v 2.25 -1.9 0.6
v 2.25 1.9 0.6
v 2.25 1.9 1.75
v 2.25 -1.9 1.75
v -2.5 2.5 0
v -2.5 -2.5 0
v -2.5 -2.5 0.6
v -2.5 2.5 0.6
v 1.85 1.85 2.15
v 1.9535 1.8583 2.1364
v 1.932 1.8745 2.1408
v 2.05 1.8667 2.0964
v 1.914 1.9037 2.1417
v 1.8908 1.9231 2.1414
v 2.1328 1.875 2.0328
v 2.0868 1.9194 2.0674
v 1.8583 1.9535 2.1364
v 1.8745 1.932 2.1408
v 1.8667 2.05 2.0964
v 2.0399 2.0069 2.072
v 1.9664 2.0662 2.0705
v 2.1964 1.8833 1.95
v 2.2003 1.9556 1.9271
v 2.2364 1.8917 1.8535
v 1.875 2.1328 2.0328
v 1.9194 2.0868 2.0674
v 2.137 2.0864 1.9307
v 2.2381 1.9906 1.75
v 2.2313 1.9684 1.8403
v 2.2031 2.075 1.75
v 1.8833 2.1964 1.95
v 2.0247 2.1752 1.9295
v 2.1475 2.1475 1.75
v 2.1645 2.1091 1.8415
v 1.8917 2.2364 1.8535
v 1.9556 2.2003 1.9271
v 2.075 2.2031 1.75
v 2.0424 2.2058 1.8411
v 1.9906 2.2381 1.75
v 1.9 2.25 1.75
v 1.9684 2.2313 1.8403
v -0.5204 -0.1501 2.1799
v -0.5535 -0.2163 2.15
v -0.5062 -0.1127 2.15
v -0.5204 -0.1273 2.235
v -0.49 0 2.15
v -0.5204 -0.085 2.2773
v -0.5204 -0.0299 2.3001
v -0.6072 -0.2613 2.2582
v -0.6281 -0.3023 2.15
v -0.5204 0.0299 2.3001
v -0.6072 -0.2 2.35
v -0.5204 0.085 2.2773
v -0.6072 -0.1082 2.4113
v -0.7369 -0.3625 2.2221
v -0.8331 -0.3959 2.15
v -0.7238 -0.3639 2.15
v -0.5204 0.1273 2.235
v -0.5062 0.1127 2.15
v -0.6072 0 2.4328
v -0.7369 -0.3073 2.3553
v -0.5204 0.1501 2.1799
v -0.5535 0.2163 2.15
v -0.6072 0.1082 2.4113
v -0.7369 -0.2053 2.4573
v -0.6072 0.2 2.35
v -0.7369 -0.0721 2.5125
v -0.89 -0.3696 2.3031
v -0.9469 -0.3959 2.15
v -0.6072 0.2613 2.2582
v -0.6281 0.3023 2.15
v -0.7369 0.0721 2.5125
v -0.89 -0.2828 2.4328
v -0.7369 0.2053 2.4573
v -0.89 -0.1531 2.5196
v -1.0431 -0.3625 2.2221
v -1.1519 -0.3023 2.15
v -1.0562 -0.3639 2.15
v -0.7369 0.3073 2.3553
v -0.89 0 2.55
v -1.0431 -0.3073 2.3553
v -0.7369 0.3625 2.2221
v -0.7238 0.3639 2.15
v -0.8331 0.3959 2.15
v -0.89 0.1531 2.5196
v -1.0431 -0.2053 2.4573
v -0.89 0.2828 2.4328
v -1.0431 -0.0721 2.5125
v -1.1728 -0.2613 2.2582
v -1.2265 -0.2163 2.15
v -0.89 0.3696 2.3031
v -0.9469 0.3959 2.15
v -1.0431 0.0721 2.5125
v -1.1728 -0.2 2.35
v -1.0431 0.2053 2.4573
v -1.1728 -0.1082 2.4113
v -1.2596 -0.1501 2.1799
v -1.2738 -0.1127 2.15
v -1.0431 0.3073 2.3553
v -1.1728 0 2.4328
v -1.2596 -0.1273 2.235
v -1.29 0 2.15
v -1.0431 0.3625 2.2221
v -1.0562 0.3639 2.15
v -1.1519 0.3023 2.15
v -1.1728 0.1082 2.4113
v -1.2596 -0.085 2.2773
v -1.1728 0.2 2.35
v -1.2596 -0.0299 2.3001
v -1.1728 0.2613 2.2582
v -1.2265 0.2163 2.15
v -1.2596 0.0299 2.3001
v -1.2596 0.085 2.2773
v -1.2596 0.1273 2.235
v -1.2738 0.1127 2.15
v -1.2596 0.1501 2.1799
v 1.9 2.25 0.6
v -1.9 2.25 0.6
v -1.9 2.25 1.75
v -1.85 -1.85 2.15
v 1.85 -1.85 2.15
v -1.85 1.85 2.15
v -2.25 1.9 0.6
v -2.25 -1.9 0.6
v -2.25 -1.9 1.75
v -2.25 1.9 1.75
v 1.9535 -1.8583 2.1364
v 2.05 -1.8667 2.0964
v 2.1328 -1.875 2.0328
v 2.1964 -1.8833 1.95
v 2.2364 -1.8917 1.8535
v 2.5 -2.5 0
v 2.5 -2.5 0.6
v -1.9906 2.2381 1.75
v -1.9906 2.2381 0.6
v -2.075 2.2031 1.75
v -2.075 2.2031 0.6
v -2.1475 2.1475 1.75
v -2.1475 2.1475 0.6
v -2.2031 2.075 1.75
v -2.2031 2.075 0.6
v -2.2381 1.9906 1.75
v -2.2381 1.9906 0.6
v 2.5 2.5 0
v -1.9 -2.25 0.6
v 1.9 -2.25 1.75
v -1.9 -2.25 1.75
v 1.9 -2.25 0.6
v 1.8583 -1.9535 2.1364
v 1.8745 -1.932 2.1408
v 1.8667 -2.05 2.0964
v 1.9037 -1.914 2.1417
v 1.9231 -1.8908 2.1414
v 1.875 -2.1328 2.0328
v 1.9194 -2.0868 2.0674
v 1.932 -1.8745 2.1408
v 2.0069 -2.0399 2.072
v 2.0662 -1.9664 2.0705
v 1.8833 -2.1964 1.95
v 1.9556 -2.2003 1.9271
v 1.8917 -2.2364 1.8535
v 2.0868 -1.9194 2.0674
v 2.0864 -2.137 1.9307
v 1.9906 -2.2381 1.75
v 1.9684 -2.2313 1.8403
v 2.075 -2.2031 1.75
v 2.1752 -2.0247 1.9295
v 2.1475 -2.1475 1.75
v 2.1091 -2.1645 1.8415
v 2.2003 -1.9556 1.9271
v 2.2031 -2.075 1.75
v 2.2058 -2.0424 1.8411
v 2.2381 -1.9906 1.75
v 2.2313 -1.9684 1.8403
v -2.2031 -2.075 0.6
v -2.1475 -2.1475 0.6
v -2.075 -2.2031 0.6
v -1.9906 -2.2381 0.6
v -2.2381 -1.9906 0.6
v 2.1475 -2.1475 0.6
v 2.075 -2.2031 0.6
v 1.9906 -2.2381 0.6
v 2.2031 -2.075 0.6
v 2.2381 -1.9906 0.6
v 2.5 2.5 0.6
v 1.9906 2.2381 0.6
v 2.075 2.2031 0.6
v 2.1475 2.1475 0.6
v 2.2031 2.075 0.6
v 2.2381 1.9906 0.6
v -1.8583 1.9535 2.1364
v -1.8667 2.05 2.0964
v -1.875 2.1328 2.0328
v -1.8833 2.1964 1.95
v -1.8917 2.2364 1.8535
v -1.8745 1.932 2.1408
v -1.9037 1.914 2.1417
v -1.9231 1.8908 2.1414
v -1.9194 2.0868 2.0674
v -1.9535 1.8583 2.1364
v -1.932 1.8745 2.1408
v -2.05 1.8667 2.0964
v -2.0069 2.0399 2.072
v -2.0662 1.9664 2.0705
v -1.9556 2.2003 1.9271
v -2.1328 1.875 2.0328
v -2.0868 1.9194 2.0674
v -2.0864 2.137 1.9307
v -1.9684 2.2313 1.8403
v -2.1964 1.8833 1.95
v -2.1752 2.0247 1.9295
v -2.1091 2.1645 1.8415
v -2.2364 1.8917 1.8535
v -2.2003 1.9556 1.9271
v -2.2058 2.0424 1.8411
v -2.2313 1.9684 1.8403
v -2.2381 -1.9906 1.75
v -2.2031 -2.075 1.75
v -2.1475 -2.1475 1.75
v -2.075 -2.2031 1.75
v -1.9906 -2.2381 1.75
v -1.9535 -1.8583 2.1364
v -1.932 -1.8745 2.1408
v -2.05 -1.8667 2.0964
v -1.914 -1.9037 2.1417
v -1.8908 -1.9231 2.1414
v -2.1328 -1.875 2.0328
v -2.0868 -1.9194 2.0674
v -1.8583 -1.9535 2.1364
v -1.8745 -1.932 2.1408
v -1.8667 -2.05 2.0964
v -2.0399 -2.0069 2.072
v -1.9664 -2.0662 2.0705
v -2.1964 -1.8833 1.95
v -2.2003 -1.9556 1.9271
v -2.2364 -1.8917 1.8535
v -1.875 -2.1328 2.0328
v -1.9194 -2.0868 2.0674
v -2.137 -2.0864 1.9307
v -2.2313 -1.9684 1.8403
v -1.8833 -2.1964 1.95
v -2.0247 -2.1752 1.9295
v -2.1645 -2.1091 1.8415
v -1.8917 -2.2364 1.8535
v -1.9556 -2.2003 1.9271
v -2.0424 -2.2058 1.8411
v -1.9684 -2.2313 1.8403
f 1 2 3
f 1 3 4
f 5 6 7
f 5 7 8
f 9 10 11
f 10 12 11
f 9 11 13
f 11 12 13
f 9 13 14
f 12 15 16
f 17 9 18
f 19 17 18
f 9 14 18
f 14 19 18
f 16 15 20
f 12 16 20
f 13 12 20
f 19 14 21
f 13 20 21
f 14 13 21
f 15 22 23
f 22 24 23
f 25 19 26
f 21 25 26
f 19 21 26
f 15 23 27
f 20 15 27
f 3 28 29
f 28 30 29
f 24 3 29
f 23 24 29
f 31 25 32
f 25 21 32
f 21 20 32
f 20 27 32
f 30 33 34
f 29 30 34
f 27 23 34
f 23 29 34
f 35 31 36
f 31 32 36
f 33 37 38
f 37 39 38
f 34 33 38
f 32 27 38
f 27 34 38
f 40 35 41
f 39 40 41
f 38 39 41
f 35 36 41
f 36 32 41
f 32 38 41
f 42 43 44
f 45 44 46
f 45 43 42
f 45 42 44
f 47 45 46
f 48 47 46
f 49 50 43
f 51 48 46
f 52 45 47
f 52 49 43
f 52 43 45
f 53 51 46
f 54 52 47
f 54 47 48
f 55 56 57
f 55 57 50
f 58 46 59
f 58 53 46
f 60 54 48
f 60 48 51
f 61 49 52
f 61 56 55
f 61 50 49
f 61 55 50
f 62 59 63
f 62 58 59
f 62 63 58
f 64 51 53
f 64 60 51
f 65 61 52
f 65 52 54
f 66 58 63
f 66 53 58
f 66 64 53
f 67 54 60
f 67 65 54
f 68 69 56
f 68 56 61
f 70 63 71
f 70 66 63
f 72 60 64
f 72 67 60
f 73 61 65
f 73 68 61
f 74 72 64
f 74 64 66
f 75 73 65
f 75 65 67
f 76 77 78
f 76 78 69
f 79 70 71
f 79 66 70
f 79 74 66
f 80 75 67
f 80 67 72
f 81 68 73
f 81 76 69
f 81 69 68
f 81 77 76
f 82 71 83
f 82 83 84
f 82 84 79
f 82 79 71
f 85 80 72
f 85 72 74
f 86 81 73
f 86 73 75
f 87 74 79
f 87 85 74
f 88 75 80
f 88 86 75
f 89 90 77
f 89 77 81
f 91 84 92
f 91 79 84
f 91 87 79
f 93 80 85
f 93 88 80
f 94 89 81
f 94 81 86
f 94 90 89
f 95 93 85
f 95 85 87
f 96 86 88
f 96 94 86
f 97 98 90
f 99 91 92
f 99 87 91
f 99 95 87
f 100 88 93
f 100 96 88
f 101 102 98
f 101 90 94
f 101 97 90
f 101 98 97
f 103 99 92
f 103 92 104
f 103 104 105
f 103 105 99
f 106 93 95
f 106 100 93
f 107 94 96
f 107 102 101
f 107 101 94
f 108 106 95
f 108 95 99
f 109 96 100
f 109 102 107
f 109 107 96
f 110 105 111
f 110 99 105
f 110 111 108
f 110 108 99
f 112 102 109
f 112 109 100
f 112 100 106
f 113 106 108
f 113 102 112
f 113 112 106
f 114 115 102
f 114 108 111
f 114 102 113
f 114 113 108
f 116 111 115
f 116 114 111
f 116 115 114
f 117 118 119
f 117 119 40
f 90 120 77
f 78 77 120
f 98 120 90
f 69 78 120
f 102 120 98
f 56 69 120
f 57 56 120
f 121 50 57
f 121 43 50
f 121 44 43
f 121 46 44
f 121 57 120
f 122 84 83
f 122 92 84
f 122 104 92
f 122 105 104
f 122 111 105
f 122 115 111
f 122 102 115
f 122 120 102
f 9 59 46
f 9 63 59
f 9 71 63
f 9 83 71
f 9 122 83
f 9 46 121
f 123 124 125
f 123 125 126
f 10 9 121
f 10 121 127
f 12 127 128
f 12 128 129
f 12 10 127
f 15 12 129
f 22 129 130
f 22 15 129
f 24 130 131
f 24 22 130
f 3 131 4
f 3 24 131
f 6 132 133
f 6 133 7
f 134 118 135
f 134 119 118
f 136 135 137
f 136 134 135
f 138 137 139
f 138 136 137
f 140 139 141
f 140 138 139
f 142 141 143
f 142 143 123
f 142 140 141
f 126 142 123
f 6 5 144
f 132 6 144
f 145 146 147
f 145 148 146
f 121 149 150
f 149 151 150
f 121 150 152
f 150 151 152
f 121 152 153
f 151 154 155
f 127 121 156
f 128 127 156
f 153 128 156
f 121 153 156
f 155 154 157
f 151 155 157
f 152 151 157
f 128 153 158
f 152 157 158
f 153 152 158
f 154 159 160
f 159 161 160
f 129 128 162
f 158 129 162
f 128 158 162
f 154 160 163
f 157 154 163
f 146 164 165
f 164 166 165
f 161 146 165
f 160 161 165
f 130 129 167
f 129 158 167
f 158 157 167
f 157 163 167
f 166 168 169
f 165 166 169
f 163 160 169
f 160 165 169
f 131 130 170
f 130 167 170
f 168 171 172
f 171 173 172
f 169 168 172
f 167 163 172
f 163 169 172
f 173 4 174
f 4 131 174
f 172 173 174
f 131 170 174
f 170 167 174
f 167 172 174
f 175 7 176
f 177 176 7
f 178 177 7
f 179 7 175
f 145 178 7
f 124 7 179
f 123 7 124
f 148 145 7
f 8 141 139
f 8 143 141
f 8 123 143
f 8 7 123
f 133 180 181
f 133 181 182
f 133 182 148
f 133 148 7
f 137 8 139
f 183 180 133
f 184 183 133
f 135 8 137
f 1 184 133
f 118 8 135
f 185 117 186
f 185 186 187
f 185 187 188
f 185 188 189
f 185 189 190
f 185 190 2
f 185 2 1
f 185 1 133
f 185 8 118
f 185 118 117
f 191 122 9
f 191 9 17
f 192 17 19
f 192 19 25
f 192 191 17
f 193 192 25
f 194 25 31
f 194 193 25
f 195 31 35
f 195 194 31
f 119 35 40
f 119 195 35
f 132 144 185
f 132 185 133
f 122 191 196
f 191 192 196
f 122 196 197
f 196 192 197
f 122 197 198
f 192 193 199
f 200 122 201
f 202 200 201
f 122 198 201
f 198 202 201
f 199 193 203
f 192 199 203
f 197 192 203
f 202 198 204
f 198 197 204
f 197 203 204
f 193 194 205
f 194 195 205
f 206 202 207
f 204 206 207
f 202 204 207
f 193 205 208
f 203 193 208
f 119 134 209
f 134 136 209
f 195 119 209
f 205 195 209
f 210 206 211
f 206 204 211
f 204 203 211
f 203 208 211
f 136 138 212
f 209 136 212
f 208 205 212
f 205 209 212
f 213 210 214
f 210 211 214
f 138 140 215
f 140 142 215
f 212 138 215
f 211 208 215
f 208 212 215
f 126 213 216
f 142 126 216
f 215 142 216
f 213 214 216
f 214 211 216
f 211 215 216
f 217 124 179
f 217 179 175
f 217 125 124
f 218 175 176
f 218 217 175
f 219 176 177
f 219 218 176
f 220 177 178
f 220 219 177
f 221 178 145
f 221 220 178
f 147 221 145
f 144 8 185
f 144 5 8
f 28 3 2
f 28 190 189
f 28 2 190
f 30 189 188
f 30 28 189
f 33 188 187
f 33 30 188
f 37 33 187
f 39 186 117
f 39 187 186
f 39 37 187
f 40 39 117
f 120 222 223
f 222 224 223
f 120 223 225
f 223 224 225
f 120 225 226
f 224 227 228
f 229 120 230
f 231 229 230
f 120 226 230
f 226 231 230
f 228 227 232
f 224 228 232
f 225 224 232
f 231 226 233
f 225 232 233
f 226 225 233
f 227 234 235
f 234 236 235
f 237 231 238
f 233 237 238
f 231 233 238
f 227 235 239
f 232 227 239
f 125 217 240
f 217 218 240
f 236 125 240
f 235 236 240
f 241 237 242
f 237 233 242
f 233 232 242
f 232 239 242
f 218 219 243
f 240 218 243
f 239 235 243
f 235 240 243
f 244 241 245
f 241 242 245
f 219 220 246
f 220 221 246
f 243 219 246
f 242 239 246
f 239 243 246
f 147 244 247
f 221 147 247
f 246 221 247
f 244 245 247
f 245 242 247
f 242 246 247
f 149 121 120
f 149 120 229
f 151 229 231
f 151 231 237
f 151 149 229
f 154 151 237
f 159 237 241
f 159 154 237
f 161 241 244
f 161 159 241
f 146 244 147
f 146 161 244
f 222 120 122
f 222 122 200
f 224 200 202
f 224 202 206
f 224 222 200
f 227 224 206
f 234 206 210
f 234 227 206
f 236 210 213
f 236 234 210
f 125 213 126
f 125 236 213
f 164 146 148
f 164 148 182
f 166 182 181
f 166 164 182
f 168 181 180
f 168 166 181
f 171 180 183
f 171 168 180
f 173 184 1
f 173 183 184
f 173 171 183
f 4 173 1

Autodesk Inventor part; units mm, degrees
ref_plane "YZ Plane" through (0, 0, 0) normal (1, 0, 0) x (0, 1, 0)
ref_plane "XZ Plane" through (0, 0, 0) normal (0, 1, 0) x (-1, 0, 0)
ref_plane "XY Plane" through (0, 0, 0) normal (0, 0, 1) x (1, 0, 0)
sketch "草图1" plane through (0, 0, 0) normal (0, 0, 1) x (1, 0, 0)
  line L0 (-2.5, 2.5) -> (2.5, 2.5)
  line L1 (2.5, 2.5) -> (2.5, -2.5)
  line L2 (2.5, -2.5) -> (-2.5, -2.5)
  line L3 (-2.5, -2.5) -> (-2.5, 2.5)
  point P0 (0, 0)
  point P1 (0, 2.5)
  point P2 (-2.5, 0)
  dimension "d0" = 5
  dimension "d1" = 5
extrude "拉伸1" add sketch "草图1" along normal blind 0.6
sketch "草图2" plane through (0, 0, 0.6) normal (0, 0, 1) x (1, 0, 0)
  line L0 (-2.25, 2.25) -> (2.25, 2.25)
  line L1 (2.25, 2.25) -> (2.25, -2.25)
  line L2 (2.25, -2.25) -> (-2.25, -2.25)
  line L3 (-2.25, -2.25) -> (-2.25, 2.25)
  point P0 (0, 0)
  point P1 (-2.25, 0)
  point P2 (0, 2.25)
  dimension "d4" = 4.5
  dimension "d5" = 4.5
extrude "拉伸2" add sketch "草图2" along normal blind 1.55
sketch "草图3" plane through (0, 0, 2.15) normal (0, 0, 1) x (1, 0, 0)
  line L0 (2.25, 2.25) -> (-2.25, 2.25) projected
  line L1 (-2.25, 2.25) -> (-2.25, -2.25) projected
  line L2 (-2.25, -2.25) -> (2.25, -2.25) projected
  line L3 (2.25, -2.25) -> (2.25, 2.25) projected
  line L4 (2.25, 2.25) -> (2.25, -2.25) projected
  line L5 (2.25, -2.25) -> (-2.25, -2.25) projected
  line L6 (-2.25, -2.25) -> (-2.25, 2.25) projected
  line L7 (-2.25, 2.25) -> (2.25, 2.25) projected
  line L8 (2.5, 2.5) -> (-2.5, 2.5) projected
  line L9 (-2.5, 2.5) -> (-2.5, -2.5) projected
  line L10 (-2.5, -2.5) -> (2.5, -2.5) projected
  line L11 (2.5, -2.5) -> (2.5, 2.5) projected
  arc A0 (-0.49, 0) -> (-1.29, 0) centre (-0.89, 0) ccw
  line L12 (-1.29, 0) -> (-0.49, 0)
  point P0 (0, 0)
  point P1 (-2.25, 0)
  point P2 (-2.5, 0)
  dimension "d8" = 1.61
  dimension "d10" = 0.4
revolve "旋转1" add sketch "草图3" angle 360 about axis through (-1.29, 0, 2.15) along (1, 0, 0) contours L12 A0
fillet "圆角1" radius 0.35 4 edges at (-2.25, -2.25, 1.375) (2.25, -2.25, 1.375) (2.25, 2.25, 1.375) (-2.25, 2.25, 1.375)
fillet "圆角2" radius 0.4 8 edges at (-2.1475, 2.1475, 2.15) (-2.25, 0, 2.15) (-2.1475, -2.1475, 2.15) (0, -2.25, 2.15) (2.1475, -2.1475, 2.15) (2.25, 0, 2.15) (2.1475, 2.1475, 2.15) (0, 2.25, 2.15)
equation "\"d1\" = d0"
equation "\"d5\" = d4"
properties part number "FMA-Sensor-Body"
